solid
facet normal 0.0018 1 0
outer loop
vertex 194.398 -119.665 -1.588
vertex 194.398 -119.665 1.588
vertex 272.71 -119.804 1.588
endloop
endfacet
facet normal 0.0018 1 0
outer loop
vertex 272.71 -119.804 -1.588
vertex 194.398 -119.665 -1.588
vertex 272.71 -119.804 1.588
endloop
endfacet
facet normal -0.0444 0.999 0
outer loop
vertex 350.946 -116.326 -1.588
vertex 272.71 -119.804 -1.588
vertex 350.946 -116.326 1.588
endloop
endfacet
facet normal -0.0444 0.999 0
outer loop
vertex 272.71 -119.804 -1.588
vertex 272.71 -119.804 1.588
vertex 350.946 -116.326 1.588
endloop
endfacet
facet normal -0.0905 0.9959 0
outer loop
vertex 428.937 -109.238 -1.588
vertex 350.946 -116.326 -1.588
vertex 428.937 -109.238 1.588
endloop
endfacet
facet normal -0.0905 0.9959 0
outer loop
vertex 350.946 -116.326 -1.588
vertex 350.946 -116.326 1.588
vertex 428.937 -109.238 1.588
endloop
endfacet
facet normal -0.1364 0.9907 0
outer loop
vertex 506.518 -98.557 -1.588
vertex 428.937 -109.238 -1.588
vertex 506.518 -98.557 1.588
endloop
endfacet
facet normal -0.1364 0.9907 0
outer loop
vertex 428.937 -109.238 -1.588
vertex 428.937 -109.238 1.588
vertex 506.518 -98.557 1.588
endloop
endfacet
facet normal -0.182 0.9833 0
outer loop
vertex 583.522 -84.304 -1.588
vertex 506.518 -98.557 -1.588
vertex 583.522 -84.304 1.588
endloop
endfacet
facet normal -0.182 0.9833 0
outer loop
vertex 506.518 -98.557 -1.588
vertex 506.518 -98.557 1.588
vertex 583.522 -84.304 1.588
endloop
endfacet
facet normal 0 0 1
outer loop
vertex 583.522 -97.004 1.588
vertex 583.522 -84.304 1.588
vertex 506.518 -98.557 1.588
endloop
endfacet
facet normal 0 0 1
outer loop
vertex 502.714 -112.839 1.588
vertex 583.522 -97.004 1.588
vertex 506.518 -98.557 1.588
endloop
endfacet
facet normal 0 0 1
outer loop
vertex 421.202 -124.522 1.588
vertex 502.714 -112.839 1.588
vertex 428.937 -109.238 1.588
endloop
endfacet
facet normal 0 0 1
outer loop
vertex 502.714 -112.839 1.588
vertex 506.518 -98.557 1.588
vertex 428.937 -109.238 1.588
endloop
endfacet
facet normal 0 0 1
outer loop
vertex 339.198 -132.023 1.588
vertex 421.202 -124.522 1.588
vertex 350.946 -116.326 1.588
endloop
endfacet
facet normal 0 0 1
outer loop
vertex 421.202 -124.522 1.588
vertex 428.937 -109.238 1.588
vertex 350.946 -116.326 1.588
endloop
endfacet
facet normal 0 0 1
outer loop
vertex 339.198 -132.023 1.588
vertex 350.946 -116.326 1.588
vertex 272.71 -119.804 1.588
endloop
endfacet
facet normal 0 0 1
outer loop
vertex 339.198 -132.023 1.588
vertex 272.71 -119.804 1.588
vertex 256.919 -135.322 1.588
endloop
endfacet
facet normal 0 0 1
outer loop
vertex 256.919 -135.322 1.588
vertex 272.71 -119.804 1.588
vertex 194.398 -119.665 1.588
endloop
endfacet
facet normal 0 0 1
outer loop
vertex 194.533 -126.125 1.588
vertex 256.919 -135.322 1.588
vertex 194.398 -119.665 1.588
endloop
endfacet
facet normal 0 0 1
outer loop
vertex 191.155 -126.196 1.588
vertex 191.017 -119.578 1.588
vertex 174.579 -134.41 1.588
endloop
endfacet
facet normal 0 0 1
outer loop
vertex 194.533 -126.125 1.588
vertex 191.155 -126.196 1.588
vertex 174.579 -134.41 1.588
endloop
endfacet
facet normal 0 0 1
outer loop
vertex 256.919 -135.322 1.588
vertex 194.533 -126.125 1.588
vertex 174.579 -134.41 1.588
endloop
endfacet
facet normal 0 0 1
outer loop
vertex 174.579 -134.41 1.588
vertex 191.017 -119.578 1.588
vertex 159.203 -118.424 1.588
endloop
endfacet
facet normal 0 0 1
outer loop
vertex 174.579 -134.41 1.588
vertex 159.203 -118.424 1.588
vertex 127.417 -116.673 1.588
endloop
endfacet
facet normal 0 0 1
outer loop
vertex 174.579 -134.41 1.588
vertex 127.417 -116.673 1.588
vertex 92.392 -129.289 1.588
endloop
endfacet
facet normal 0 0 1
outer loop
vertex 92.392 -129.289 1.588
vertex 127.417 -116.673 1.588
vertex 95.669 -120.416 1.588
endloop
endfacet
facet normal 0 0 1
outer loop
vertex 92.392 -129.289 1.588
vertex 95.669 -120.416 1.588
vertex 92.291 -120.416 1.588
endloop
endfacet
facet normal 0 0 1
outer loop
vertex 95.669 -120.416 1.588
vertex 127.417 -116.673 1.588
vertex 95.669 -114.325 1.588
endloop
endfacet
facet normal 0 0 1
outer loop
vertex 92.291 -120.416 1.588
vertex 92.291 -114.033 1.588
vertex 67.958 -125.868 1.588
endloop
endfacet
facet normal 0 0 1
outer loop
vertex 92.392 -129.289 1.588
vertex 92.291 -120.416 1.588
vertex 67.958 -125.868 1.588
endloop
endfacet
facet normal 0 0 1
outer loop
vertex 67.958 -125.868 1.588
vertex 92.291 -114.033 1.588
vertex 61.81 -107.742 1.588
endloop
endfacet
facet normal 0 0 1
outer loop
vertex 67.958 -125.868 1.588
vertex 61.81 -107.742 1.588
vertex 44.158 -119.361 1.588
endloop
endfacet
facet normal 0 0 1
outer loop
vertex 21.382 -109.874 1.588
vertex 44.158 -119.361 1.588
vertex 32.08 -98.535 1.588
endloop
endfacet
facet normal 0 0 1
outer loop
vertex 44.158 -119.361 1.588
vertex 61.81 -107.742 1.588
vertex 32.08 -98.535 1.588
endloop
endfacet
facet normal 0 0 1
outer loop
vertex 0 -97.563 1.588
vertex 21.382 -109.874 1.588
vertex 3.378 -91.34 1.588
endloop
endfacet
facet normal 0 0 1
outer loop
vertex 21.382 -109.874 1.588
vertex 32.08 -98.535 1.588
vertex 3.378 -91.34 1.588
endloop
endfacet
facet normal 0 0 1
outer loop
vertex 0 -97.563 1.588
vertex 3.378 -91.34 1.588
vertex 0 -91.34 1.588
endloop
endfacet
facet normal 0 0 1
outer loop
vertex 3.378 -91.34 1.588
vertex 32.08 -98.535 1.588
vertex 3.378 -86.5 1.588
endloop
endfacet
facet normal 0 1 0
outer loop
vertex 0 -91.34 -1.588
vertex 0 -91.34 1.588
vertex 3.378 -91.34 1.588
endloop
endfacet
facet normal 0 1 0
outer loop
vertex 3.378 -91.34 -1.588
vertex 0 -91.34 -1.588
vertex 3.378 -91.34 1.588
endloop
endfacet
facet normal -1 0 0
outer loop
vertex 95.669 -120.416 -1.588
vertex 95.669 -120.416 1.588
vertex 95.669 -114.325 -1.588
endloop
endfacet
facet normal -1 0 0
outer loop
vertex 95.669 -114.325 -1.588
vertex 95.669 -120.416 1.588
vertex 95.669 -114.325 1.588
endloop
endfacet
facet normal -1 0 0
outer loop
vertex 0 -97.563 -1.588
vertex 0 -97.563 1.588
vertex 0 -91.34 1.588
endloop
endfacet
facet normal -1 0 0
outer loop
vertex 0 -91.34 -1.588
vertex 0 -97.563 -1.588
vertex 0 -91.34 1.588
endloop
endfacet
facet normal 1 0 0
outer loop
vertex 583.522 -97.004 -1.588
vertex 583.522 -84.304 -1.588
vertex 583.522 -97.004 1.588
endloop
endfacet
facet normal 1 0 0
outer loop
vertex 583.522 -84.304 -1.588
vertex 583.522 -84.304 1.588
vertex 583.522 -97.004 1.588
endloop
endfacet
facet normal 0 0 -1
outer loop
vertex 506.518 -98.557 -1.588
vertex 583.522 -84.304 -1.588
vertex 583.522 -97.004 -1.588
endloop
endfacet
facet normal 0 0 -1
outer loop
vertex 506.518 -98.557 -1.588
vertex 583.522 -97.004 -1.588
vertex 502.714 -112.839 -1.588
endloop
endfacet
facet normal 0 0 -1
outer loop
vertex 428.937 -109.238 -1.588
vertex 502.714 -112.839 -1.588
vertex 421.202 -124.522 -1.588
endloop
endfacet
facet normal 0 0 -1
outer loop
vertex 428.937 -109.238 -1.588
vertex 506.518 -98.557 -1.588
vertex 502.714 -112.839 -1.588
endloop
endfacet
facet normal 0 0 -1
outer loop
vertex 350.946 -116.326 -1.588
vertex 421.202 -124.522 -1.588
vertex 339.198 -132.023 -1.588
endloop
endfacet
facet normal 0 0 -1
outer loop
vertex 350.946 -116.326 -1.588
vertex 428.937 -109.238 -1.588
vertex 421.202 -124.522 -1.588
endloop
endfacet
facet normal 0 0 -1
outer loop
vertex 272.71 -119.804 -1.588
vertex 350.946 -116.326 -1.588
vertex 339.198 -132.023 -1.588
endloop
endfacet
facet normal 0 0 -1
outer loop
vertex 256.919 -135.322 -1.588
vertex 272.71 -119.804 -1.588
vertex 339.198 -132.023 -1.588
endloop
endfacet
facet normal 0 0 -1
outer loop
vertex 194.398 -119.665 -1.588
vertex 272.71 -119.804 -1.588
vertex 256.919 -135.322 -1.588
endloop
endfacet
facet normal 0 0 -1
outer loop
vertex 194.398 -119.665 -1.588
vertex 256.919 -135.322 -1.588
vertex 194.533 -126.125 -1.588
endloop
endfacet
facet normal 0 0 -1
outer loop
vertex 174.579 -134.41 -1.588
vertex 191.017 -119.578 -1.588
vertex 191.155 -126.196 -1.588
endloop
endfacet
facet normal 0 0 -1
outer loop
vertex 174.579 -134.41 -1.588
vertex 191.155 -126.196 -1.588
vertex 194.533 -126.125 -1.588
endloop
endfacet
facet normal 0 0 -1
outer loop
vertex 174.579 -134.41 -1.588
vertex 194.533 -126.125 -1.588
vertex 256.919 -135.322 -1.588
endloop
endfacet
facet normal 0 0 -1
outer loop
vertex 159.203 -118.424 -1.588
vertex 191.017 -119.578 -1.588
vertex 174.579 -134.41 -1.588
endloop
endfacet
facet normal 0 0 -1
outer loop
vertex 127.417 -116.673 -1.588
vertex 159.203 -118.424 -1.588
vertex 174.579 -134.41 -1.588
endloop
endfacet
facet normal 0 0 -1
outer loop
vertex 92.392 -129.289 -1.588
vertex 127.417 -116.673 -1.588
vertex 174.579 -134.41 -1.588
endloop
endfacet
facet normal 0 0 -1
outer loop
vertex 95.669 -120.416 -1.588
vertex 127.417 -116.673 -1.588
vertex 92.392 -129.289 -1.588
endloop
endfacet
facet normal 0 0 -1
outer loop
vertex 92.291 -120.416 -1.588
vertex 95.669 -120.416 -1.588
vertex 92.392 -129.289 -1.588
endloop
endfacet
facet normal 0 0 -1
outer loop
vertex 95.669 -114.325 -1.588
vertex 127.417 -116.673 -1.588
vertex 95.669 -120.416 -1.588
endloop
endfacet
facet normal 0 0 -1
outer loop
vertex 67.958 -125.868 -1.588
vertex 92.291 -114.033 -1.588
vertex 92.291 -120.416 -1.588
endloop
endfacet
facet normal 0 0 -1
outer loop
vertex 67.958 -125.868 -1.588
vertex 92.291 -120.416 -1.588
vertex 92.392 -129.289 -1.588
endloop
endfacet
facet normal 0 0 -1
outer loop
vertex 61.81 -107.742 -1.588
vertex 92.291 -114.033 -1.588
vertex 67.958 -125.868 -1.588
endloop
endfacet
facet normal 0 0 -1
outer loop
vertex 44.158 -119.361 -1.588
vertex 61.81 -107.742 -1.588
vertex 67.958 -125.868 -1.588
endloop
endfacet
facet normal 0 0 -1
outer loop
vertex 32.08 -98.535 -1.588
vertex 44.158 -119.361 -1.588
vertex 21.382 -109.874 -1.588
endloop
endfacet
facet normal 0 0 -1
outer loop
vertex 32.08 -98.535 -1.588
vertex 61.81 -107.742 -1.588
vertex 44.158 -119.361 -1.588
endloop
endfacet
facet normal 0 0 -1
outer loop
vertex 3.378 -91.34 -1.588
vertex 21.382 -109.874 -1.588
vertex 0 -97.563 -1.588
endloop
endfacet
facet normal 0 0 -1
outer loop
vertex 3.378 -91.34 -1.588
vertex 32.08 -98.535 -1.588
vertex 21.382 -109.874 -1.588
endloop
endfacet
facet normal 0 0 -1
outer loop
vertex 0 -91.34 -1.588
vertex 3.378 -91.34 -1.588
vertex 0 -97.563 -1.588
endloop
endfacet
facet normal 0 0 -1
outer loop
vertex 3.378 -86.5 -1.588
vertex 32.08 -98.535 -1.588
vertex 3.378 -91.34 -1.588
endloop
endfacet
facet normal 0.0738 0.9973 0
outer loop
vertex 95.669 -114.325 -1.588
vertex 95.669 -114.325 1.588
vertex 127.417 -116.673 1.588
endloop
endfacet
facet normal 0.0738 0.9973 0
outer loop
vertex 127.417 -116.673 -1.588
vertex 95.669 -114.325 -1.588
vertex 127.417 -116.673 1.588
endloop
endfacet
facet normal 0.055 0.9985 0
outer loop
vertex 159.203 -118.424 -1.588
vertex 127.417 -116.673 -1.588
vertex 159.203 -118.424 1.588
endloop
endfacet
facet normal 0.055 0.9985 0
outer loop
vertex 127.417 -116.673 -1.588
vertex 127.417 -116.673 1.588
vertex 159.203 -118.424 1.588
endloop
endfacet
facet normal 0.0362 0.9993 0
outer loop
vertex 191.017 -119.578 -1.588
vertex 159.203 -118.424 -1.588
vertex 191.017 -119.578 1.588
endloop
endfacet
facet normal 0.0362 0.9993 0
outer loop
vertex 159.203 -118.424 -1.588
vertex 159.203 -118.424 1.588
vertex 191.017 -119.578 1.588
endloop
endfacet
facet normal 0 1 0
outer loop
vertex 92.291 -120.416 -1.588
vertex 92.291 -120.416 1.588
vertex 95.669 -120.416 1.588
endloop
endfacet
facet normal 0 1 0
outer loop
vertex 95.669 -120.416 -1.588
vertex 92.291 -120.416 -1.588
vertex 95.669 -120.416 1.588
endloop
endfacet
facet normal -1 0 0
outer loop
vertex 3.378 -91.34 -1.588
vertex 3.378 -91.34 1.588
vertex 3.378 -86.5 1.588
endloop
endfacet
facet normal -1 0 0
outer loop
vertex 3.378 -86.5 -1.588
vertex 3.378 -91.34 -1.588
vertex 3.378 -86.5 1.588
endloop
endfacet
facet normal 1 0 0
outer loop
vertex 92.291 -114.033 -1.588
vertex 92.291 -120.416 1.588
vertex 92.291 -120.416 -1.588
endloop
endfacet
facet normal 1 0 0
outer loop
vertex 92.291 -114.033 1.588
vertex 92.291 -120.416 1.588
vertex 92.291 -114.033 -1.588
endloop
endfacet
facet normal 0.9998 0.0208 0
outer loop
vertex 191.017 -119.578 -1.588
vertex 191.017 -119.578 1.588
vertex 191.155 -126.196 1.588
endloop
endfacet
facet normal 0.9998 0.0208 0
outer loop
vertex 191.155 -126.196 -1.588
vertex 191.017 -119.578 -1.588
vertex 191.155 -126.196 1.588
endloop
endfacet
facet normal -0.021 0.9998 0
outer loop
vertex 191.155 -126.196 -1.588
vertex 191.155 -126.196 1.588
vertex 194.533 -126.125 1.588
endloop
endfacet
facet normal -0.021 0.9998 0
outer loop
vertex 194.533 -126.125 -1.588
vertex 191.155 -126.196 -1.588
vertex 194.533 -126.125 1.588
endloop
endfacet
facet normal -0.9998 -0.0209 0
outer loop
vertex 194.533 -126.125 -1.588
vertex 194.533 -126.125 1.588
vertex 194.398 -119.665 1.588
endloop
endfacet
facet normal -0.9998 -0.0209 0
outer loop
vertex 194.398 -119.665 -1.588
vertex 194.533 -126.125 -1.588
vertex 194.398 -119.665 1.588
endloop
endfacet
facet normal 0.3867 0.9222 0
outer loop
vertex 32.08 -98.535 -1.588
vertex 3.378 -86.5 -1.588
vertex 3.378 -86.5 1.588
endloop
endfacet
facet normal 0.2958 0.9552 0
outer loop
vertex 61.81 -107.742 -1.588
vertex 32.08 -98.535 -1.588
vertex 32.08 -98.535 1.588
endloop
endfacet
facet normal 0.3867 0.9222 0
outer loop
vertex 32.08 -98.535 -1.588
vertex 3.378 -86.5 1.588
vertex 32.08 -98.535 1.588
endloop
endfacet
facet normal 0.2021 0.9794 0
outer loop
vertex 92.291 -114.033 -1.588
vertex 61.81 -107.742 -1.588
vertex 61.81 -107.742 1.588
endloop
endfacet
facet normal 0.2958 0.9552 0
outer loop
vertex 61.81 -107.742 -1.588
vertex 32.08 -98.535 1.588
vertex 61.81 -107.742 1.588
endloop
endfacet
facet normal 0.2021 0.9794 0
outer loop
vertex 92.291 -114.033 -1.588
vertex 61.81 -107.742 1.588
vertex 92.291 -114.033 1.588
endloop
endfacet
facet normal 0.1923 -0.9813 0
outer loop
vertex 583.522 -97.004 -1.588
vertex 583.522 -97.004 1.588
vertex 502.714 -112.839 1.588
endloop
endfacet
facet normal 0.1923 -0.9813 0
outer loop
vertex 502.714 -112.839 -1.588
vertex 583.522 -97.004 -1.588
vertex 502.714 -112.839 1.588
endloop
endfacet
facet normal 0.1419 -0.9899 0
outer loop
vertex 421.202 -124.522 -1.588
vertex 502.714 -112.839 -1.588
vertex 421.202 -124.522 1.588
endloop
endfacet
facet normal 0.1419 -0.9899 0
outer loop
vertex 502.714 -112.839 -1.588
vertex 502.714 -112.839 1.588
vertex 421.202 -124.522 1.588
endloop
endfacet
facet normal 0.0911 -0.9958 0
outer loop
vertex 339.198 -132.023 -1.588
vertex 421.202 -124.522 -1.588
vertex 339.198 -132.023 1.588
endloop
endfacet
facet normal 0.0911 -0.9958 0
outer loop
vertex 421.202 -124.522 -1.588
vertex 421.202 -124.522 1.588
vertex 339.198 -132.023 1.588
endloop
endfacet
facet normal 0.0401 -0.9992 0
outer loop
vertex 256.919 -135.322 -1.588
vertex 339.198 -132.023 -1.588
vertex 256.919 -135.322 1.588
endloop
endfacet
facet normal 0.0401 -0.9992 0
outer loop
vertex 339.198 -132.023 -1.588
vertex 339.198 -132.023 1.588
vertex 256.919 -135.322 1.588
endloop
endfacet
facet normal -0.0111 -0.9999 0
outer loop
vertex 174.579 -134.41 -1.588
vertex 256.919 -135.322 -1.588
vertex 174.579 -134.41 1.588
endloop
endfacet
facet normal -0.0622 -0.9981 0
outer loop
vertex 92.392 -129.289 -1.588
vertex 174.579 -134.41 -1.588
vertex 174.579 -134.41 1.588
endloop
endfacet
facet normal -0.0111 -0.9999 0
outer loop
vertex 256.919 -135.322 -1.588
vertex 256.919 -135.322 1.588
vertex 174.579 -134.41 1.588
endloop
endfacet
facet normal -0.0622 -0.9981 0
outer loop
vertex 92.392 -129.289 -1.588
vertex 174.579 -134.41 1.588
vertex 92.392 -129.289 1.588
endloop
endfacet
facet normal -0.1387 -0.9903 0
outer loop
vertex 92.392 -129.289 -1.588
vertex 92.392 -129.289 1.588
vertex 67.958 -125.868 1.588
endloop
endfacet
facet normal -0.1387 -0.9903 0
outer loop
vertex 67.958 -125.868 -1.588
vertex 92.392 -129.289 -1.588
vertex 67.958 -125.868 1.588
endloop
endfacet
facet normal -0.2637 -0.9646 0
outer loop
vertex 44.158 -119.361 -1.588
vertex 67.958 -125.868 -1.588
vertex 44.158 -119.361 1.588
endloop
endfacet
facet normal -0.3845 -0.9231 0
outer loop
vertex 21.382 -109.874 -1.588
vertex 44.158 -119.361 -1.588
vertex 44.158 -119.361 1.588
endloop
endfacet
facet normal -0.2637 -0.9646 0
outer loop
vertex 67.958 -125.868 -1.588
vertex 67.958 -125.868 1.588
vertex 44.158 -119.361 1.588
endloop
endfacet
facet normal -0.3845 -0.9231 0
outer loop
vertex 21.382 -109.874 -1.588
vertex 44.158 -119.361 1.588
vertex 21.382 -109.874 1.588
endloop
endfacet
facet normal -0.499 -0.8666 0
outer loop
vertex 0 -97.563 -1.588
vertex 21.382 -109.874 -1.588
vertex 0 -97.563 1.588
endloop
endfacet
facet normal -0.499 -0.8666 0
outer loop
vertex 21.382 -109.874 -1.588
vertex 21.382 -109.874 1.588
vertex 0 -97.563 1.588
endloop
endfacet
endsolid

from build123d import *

# Parameters (mm, degrees)
BOSS_EXTRUDE1_DEPTH = 1.5875
SKETCH2_W           = 3.3782
SKETCH2_H           = 6.477
SKETCH2_H_2         = 12.7
CUT_EXTRUDE1_DEPTH  = 4.175


with BuildPart() as part:
    # Sketch1 → Boss-Extrude1 (new body, symmetric)
    with BuildSketch(Plane.XY):
        with BuildLine():
            Line((0, -97.563004684), (0, -84.863004684))
            ThreePointArc((0, -84.863004684), (45.091480007, -102.953300884), (92.3925, -114.048970912))
            ThreePointArc((92.3925, -114.048970912), (339.042339878, -117.088496575), (583.522463964, -84.303573898))
            Line((583.522463964, -84.303573898), (583.522463964, -97.003573898))
            ThreePointArc((583.522463964, -97.003573898), (339.198389145, -132.023125314), (92.3925, -129.288970912))
            ThreePointArc((92.3925, -129.288970912), (44.158404147, -119.360611557), (0, -97.563004684))
        make_face()
    extrude(amount=BOSS_EXTRUDE1_DEPTH, both=True)

    # Sketch2 → Cut-Extrude1 (cut, through all)
    with BuildSketch(Plane.XY.offset(1.5875)):
        with Locations((1.6891, -88.101504684)):
            Rectangle(SKETCH2_W, SKETCH2_H)
        with Locations((93.98, -114.06579143)):
            Rectangle(SKETCH2_W, SKETCH2_H_2)
        Polygon((191.155368795, -126.195526401), (194.532828758, -126.124819669), (194.267013976, -113.427601765), (190.889554014, -113.498308497), align=None)
    extrude(amount=-CUT_EXTRUDE1_DEPTH, mode=Mode.SUBTRACT)


solid = part.part
